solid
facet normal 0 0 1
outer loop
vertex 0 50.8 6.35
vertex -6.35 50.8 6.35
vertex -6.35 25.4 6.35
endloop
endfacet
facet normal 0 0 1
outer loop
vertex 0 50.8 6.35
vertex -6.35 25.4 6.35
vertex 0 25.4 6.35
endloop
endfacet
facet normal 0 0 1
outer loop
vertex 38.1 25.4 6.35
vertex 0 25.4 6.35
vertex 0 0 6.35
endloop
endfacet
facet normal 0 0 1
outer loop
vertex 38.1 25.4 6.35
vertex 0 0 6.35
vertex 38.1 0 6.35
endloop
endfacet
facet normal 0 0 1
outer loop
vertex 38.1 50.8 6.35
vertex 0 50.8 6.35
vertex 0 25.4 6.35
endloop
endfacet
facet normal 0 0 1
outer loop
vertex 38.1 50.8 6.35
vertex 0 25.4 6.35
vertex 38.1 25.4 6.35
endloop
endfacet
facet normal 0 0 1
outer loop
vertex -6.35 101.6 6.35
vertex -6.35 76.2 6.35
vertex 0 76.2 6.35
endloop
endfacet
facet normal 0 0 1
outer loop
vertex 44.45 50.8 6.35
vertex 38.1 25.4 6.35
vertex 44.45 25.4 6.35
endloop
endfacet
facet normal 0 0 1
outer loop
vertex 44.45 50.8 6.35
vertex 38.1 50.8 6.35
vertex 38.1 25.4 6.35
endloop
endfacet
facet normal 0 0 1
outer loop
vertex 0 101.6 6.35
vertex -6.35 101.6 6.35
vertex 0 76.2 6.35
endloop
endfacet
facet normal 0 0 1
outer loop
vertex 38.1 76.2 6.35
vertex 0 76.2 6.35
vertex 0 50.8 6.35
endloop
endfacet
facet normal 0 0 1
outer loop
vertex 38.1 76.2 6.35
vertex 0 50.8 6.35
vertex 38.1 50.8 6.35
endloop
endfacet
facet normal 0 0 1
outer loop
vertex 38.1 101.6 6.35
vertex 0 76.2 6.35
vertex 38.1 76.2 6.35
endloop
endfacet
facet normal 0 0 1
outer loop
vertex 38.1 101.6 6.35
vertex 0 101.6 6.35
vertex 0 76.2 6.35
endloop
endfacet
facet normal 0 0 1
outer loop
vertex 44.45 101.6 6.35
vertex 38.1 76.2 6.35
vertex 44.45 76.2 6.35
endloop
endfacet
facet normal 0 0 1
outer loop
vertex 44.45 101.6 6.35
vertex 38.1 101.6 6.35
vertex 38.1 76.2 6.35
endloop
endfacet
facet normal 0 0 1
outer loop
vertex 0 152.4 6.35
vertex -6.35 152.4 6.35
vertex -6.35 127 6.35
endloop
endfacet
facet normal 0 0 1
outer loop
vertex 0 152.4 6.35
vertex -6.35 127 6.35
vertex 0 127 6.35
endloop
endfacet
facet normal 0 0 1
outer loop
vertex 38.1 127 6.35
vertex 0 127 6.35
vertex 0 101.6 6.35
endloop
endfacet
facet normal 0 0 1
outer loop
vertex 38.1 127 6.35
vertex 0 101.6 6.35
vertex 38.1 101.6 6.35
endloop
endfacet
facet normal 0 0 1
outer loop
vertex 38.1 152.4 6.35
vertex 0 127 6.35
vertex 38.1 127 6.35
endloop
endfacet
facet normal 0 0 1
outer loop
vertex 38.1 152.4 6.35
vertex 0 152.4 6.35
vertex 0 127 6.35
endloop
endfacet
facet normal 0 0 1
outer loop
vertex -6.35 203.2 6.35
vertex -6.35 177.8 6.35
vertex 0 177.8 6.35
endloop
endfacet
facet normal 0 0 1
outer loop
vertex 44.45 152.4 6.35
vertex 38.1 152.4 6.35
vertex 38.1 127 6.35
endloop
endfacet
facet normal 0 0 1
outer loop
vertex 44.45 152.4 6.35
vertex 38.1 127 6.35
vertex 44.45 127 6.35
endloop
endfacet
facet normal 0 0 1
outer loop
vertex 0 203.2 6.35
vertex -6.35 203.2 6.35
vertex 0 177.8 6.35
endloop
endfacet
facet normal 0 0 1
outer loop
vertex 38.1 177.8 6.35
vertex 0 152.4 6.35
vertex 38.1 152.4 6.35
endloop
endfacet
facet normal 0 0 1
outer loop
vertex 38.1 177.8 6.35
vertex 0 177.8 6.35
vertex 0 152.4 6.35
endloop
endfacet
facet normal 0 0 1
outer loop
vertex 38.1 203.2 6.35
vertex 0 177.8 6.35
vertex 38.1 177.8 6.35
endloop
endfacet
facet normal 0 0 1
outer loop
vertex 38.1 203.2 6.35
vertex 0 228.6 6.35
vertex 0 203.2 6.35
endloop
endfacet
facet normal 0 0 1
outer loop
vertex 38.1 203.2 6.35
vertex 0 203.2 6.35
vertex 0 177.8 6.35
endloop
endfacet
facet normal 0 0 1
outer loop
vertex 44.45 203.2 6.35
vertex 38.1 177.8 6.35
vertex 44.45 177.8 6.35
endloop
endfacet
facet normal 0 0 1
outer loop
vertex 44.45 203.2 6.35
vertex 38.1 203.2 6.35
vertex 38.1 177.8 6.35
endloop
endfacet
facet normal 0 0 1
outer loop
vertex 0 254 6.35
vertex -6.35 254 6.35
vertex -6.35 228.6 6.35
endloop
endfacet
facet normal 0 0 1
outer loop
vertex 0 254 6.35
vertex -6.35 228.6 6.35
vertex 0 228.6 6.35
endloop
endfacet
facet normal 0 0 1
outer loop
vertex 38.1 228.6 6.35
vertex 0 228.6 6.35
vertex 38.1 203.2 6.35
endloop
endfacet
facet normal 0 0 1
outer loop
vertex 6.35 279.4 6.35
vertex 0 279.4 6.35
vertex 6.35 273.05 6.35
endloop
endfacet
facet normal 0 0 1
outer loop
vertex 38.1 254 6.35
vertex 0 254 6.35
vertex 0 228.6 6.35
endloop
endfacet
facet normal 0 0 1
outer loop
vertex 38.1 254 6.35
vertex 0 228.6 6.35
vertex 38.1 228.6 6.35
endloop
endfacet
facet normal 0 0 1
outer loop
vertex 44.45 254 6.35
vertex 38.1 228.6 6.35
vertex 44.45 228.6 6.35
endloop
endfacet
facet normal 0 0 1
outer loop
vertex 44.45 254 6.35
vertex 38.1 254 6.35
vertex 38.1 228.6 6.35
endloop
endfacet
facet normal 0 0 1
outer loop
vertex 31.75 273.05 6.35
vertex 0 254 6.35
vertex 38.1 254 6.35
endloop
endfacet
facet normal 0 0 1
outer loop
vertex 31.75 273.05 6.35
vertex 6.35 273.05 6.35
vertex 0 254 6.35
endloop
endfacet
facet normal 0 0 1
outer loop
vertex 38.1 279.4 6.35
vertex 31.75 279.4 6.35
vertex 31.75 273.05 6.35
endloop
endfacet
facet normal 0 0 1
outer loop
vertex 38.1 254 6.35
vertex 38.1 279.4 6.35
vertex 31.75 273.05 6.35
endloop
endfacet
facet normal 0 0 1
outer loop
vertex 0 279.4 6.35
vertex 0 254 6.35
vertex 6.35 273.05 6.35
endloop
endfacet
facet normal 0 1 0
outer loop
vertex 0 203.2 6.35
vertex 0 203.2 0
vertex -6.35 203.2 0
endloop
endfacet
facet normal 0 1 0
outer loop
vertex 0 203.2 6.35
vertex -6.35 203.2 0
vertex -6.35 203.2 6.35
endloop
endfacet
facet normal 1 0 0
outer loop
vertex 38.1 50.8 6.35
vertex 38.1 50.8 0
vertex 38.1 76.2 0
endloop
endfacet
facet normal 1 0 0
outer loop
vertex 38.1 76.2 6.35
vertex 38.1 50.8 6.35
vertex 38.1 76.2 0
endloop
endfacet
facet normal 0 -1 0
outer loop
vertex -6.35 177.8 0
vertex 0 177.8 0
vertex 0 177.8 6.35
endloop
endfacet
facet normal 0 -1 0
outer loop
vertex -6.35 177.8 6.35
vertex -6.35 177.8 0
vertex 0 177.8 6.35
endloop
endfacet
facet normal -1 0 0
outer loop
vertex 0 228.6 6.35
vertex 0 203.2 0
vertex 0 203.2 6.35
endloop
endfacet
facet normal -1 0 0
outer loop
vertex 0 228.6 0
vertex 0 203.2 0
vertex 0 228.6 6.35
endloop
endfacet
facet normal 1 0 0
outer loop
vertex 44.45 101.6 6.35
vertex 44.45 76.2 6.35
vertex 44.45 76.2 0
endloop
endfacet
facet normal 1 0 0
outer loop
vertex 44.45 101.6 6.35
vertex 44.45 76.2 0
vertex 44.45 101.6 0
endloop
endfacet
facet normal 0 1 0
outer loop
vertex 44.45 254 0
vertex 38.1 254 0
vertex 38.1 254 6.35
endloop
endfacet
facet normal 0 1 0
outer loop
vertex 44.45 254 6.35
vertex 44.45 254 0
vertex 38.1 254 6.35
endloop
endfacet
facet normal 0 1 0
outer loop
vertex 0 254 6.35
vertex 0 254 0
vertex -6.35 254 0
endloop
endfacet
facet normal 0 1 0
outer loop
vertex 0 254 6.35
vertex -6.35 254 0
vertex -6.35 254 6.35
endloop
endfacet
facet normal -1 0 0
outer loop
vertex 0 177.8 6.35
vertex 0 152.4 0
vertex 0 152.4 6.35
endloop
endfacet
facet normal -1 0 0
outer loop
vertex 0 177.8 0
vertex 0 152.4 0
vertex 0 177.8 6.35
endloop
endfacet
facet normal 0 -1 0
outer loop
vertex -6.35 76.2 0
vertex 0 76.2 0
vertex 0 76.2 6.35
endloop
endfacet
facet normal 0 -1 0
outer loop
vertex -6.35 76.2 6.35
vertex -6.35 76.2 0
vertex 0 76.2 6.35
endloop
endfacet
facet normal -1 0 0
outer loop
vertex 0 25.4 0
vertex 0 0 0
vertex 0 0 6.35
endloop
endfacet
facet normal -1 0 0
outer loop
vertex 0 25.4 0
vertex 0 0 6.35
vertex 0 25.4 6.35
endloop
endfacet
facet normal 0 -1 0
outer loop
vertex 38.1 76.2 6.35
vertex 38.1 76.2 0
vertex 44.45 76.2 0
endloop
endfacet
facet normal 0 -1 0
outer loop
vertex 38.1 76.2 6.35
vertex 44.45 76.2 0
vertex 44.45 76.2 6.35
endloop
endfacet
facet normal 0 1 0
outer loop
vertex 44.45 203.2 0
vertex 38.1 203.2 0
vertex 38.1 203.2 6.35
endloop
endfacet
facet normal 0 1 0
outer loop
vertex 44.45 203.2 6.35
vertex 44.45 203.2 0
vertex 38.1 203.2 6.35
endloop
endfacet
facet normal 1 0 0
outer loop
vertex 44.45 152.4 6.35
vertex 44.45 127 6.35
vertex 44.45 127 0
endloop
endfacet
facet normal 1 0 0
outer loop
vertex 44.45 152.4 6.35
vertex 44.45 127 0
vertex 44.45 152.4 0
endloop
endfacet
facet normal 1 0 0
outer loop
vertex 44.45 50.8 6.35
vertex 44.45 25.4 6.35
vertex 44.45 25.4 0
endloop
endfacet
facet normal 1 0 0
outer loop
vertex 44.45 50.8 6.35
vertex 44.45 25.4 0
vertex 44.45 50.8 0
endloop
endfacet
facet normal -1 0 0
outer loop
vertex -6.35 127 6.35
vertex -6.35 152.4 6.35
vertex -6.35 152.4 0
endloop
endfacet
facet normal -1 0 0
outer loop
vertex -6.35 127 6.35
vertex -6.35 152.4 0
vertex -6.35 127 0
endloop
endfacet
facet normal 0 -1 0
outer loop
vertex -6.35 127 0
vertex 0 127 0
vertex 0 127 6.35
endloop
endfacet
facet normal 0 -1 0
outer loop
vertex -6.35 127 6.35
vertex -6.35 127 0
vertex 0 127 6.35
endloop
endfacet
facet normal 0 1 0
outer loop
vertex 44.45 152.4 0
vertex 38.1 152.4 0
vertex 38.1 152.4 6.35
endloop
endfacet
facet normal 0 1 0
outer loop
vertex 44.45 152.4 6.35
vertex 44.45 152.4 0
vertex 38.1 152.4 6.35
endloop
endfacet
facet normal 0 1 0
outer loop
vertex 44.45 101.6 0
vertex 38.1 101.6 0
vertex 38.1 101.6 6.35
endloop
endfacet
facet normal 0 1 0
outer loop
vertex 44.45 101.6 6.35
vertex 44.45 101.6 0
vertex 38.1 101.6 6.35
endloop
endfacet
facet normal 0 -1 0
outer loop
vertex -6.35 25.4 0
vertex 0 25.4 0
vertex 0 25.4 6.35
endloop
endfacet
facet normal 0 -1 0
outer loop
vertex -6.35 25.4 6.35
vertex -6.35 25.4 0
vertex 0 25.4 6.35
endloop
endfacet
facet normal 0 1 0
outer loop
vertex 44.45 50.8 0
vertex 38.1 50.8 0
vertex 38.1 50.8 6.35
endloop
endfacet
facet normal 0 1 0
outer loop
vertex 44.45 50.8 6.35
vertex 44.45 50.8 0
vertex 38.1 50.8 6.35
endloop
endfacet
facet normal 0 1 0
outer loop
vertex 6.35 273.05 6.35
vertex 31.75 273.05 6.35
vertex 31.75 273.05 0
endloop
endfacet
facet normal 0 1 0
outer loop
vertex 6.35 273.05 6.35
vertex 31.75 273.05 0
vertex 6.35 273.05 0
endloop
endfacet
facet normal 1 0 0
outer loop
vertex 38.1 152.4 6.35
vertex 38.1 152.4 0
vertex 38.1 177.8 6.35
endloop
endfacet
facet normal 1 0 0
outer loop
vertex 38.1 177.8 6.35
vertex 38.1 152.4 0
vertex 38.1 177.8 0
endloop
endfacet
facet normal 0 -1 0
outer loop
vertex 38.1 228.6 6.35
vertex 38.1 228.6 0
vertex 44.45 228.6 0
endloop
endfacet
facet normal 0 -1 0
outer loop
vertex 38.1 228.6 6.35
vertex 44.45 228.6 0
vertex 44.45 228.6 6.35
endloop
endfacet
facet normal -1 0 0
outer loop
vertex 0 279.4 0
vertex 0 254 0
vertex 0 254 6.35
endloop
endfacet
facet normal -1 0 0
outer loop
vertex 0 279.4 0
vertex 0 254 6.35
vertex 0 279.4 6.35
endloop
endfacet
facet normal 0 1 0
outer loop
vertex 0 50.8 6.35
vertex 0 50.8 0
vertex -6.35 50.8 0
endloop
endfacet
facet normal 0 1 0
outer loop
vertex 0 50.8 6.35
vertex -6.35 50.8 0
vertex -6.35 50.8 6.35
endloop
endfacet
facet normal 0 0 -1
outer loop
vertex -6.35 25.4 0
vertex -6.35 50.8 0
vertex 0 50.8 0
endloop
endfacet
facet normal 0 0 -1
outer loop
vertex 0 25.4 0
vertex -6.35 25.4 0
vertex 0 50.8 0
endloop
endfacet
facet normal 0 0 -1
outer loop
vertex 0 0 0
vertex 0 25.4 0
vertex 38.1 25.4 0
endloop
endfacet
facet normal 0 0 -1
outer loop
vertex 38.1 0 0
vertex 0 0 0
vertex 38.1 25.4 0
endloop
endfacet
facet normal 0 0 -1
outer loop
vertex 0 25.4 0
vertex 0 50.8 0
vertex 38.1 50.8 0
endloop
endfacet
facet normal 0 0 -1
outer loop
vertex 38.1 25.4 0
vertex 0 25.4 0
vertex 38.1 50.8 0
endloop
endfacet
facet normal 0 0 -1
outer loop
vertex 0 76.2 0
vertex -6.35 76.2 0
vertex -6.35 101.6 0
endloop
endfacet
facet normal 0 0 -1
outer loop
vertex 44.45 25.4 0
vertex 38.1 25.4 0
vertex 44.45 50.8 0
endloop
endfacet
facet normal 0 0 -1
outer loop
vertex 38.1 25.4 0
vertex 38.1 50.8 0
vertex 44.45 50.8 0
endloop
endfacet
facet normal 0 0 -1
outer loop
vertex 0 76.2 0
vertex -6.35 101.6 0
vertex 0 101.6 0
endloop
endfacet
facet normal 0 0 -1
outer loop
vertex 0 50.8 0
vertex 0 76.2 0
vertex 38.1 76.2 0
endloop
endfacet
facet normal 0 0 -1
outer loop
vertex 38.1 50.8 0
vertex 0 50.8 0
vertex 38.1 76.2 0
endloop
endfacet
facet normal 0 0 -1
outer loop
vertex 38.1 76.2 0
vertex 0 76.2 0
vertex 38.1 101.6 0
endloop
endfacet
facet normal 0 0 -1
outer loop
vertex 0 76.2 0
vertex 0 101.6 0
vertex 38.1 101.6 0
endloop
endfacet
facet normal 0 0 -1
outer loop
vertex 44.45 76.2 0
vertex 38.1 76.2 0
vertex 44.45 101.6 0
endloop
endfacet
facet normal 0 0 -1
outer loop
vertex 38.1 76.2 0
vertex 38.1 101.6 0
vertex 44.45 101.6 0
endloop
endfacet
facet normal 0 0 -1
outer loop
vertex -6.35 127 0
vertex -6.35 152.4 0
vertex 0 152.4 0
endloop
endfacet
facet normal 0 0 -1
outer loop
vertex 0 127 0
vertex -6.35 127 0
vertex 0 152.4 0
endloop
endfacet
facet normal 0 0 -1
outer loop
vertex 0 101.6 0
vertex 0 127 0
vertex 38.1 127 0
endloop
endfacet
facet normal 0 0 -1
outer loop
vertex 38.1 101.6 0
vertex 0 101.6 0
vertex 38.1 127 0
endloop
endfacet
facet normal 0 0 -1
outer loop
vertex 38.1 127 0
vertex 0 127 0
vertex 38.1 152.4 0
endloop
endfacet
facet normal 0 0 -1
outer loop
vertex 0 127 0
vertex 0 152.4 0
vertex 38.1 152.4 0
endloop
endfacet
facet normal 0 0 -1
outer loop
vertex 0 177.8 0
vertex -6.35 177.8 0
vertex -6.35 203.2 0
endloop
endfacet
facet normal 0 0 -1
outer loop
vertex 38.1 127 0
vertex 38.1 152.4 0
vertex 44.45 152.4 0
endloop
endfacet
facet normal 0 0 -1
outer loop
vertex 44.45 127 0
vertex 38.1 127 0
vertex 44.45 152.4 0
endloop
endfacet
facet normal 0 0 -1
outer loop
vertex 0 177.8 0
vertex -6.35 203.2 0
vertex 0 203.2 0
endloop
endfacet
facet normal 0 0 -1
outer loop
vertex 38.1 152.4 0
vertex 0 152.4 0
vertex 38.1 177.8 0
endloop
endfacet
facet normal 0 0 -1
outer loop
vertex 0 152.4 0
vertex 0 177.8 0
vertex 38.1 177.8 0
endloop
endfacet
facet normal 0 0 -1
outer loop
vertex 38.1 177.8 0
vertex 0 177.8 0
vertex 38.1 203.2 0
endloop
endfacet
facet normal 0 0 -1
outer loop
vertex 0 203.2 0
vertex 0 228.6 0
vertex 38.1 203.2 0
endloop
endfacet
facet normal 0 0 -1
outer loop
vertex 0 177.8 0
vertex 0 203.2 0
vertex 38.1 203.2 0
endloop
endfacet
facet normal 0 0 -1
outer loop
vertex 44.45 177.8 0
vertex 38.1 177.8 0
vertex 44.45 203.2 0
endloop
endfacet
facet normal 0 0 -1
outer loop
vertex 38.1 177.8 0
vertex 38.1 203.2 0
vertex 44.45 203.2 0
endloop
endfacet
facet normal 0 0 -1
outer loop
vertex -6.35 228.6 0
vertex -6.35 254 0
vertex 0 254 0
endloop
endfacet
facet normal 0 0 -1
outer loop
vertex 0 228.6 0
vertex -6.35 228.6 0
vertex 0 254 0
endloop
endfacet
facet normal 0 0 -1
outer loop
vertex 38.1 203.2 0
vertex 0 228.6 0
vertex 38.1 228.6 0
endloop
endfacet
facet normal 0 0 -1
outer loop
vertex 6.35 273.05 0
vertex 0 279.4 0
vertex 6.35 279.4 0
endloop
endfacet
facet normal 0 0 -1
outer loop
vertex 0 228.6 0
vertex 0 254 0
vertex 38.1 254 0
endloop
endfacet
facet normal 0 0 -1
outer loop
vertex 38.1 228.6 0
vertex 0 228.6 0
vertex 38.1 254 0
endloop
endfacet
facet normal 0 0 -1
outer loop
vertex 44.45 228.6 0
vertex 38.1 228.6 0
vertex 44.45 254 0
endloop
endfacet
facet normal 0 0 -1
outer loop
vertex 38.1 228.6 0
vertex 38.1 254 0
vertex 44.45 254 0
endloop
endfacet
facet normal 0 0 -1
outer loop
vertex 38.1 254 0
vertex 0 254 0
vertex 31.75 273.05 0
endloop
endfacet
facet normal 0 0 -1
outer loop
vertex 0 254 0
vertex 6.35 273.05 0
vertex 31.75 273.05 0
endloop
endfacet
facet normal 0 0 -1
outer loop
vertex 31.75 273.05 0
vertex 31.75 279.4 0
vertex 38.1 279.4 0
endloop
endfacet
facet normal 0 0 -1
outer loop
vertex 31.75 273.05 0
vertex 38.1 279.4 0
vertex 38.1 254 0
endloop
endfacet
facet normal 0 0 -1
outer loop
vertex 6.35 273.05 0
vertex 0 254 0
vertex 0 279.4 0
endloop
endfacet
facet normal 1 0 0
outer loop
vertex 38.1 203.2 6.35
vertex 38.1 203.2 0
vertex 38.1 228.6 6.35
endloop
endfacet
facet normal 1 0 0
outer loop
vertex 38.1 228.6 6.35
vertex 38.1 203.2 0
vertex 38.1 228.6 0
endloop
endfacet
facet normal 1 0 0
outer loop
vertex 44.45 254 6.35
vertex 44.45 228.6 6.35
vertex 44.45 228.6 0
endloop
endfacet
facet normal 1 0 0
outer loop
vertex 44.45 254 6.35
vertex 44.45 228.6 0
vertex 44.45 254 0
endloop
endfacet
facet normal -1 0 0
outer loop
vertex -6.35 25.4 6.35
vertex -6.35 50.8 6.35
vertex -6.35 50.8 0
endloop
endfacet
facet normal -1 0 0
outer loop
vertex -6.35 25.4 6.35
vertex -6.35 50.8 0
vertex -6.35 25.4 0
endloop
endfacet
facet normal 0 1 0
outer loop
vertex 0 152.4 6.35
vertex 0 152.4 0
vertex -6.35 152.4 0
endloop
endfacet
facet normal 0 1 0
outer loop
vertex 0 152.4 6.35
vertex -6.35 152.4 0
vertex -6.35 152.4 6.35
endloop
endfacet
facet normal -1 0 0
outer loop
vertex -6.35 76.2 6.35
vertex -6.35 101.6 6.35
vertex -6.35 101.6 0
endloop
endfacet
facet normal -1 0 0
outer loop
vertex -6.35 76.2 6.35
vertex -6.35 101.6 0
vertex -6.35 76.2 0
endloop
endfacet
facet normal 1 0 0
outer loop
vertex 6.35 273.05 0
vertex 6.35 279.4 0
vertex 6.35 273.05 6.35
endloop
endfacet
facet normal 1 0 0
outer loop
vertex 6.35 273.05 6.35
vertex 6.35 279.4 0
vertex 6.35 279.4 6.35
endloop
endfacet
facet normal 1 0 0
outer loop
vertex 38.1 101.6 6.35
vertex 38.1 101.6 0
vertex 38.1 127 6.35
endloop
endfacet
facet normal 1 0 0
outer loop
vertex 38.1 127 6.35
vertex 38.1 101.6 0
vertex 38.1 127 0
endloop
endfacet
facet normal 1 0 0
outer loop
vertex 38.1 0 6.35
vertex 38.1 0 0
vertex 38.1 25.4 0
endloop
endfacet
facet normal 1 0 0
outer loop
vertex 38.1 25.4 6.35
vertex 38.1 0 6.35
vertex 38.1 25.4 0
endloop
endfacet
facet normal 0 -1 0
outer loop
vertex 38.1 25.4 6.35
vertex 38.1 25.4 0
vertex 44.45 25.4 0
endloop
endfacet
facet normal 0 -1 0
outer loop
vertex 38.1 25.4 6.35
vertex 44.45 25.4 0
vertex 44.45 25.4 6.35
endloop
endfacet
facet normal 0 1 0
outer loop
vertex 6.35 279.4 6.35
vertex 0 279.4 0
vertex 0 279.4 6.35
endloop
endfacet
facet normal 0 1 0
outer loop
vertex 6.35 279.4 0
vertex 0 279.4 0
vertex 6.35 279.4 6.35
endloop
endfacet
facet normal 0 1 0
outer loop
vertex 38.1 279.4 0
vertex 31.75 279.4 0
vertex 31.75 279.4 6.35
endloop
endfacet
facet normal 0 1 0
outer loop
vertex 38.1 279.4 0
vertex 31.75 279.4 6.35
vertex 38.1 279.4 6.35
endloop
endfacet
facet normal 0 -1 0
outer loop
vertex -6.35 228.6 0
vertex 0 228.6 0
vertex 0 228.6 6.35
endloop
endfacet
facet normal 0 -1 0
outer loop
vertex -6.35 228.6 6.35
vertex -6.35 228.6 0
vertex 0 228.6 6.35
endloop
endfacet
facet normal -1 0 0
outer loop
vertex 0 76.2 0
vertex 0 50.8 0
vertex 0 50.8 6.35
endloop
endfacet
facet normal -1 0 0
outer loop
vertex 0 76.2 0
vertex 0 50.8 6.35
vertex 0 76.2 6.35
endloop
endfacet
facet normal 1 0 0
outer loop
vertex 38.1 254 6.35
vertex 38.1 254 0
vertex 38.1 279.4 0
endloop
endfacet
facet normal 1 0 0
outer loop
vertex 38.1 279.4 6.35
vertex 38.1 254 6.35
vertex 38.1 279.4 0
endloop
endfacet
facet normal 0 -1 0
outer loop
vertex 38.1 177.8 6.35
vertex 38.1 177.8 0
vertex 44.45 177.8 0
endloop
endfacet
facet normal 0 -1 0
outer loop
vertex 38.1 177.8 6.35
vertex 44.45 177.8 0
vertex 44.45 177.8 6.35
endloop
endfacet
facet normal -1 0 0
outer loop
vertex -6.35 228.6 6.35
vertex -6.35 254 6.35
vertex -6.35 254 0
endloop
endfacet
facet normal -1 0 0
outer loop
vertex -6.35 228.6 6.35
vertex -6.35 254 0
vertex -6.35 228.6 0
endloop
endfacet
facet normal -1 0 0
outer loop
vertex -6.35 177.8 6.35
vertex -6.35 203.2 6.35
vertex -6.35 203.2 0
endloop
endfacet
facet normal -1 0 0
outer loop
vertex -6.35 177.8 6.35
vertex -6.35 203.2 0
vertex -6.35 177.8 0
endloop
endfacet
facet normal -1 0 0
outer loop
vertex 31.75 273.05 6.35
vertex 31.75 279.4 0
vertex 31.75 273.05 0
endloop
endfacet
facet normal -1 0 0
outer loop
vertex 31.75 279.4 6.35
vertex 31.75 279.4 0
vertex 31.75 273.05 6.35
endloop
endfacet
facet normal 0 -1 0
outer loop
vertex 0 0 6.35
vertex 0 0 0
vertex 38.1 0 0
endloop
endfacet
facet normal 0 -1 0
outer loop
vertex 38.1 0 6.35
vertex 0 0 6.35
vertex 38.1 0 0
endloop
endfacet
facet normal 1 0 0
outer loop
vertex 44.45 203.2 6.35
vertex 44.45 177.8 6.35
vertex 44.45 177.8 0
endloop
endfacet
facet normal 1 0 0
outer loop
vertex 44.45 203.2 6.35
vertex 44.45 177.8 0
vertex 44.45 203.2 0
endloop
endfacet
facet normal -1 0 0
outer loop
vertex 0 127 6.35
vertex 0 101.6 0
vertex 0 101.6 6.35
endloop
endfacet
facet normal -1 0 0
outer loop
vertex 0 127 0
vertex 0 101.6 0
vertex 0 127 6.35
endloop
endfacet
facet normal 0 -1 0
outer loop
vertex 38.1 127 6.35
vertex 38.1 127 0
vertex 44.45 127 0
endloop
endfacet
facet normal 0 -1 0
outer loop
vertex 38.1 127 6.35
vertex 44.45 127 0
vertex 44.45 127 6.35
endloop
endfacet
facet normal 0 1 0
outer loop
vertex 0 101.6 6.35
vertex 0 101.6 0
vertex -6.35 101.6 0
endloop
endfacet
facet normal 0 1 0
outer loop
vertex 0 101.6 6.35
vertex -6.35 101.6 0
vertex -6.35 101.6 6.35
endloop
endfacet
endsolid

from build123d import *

# Parameters (mm, degrees)
F0_W     = 38.1
F0_H     = 279.4
F1_DEPTH = 6.35
F2_W     = 25.4
F2_H     = 6.35
F4_DEPTH = 6.35
F3_W     = 25.4
F3_H     = 6.35
F5_DEPTH = 6.35
F6_W     = 25.4
F6_H     = 6.35
F7_DEPTH = 6.35


with BuildPart() as f1:
    # F0 (on Top) → F1 (new body)
    with BuildSketch(Plane.XY):
        with Locations((19.05, 139.7)):
            Rectangle(F0_W, F0_H)
    extrude(amount=F1_DEPTH)

    # F2 (on face) → F4 (join)
    with BuildSketch(Plane.YZ.offset(38.1)):
        with Locations((241.3, 3.175)):
            Rectangle(F2_W, F2_H)
        with Locations((190.5, 3.175)):
            Rectangle(F2_W, F2_H)
        with Locations((139.7, 3.175)):
            Rectangle(F2_W, F2_H)
        with Locations((88.9, 3.175)):
            Rectangle(F2_W, F2_H)
        with Locations((38.1, 3.175)):
            Rectangle(F2_W, F2_H)
    extrude(amount=F4_DEPTH)

    # F3 (on face) → F5 (join)
    with BuildSketch(Plane(origin=(0, 0, 0), x_dir=(0, -1, 0), z_dir=(-1, 0, 0))):
        with Locations((-38.1, 3.175)):
            Rectangle(F3_W, F3_H)
        with Locations((-88.9, 3.175)):
            Rectangle(F3_W, F3_H)
        with Locations((-139.7, 3.175)):
            Rectangle(F3_W, F3_H)
        with Locations((-190.5, 3.175)):
            Rectangle(F3_W, F3_H)
        with Locations((-241.3, 3.175)):
            Rectangle(F3_W, F3_H)
    extrude(amount=F5_DEPTH)

    # F6 (on face) → F7 (cut)
    with BuildSketch(Plane(origin=(0, 279.4, 0), x_dir=(-1, 0, 0), z_dir=(0, 1, 0))):
        with Locations((-19.05, 3.175)):
            Rectangle(F6_W, F6_H)
    extrude(amount=-F7_DEPTH, mode=Mode.SUBTRACT)


solid = f1.part
